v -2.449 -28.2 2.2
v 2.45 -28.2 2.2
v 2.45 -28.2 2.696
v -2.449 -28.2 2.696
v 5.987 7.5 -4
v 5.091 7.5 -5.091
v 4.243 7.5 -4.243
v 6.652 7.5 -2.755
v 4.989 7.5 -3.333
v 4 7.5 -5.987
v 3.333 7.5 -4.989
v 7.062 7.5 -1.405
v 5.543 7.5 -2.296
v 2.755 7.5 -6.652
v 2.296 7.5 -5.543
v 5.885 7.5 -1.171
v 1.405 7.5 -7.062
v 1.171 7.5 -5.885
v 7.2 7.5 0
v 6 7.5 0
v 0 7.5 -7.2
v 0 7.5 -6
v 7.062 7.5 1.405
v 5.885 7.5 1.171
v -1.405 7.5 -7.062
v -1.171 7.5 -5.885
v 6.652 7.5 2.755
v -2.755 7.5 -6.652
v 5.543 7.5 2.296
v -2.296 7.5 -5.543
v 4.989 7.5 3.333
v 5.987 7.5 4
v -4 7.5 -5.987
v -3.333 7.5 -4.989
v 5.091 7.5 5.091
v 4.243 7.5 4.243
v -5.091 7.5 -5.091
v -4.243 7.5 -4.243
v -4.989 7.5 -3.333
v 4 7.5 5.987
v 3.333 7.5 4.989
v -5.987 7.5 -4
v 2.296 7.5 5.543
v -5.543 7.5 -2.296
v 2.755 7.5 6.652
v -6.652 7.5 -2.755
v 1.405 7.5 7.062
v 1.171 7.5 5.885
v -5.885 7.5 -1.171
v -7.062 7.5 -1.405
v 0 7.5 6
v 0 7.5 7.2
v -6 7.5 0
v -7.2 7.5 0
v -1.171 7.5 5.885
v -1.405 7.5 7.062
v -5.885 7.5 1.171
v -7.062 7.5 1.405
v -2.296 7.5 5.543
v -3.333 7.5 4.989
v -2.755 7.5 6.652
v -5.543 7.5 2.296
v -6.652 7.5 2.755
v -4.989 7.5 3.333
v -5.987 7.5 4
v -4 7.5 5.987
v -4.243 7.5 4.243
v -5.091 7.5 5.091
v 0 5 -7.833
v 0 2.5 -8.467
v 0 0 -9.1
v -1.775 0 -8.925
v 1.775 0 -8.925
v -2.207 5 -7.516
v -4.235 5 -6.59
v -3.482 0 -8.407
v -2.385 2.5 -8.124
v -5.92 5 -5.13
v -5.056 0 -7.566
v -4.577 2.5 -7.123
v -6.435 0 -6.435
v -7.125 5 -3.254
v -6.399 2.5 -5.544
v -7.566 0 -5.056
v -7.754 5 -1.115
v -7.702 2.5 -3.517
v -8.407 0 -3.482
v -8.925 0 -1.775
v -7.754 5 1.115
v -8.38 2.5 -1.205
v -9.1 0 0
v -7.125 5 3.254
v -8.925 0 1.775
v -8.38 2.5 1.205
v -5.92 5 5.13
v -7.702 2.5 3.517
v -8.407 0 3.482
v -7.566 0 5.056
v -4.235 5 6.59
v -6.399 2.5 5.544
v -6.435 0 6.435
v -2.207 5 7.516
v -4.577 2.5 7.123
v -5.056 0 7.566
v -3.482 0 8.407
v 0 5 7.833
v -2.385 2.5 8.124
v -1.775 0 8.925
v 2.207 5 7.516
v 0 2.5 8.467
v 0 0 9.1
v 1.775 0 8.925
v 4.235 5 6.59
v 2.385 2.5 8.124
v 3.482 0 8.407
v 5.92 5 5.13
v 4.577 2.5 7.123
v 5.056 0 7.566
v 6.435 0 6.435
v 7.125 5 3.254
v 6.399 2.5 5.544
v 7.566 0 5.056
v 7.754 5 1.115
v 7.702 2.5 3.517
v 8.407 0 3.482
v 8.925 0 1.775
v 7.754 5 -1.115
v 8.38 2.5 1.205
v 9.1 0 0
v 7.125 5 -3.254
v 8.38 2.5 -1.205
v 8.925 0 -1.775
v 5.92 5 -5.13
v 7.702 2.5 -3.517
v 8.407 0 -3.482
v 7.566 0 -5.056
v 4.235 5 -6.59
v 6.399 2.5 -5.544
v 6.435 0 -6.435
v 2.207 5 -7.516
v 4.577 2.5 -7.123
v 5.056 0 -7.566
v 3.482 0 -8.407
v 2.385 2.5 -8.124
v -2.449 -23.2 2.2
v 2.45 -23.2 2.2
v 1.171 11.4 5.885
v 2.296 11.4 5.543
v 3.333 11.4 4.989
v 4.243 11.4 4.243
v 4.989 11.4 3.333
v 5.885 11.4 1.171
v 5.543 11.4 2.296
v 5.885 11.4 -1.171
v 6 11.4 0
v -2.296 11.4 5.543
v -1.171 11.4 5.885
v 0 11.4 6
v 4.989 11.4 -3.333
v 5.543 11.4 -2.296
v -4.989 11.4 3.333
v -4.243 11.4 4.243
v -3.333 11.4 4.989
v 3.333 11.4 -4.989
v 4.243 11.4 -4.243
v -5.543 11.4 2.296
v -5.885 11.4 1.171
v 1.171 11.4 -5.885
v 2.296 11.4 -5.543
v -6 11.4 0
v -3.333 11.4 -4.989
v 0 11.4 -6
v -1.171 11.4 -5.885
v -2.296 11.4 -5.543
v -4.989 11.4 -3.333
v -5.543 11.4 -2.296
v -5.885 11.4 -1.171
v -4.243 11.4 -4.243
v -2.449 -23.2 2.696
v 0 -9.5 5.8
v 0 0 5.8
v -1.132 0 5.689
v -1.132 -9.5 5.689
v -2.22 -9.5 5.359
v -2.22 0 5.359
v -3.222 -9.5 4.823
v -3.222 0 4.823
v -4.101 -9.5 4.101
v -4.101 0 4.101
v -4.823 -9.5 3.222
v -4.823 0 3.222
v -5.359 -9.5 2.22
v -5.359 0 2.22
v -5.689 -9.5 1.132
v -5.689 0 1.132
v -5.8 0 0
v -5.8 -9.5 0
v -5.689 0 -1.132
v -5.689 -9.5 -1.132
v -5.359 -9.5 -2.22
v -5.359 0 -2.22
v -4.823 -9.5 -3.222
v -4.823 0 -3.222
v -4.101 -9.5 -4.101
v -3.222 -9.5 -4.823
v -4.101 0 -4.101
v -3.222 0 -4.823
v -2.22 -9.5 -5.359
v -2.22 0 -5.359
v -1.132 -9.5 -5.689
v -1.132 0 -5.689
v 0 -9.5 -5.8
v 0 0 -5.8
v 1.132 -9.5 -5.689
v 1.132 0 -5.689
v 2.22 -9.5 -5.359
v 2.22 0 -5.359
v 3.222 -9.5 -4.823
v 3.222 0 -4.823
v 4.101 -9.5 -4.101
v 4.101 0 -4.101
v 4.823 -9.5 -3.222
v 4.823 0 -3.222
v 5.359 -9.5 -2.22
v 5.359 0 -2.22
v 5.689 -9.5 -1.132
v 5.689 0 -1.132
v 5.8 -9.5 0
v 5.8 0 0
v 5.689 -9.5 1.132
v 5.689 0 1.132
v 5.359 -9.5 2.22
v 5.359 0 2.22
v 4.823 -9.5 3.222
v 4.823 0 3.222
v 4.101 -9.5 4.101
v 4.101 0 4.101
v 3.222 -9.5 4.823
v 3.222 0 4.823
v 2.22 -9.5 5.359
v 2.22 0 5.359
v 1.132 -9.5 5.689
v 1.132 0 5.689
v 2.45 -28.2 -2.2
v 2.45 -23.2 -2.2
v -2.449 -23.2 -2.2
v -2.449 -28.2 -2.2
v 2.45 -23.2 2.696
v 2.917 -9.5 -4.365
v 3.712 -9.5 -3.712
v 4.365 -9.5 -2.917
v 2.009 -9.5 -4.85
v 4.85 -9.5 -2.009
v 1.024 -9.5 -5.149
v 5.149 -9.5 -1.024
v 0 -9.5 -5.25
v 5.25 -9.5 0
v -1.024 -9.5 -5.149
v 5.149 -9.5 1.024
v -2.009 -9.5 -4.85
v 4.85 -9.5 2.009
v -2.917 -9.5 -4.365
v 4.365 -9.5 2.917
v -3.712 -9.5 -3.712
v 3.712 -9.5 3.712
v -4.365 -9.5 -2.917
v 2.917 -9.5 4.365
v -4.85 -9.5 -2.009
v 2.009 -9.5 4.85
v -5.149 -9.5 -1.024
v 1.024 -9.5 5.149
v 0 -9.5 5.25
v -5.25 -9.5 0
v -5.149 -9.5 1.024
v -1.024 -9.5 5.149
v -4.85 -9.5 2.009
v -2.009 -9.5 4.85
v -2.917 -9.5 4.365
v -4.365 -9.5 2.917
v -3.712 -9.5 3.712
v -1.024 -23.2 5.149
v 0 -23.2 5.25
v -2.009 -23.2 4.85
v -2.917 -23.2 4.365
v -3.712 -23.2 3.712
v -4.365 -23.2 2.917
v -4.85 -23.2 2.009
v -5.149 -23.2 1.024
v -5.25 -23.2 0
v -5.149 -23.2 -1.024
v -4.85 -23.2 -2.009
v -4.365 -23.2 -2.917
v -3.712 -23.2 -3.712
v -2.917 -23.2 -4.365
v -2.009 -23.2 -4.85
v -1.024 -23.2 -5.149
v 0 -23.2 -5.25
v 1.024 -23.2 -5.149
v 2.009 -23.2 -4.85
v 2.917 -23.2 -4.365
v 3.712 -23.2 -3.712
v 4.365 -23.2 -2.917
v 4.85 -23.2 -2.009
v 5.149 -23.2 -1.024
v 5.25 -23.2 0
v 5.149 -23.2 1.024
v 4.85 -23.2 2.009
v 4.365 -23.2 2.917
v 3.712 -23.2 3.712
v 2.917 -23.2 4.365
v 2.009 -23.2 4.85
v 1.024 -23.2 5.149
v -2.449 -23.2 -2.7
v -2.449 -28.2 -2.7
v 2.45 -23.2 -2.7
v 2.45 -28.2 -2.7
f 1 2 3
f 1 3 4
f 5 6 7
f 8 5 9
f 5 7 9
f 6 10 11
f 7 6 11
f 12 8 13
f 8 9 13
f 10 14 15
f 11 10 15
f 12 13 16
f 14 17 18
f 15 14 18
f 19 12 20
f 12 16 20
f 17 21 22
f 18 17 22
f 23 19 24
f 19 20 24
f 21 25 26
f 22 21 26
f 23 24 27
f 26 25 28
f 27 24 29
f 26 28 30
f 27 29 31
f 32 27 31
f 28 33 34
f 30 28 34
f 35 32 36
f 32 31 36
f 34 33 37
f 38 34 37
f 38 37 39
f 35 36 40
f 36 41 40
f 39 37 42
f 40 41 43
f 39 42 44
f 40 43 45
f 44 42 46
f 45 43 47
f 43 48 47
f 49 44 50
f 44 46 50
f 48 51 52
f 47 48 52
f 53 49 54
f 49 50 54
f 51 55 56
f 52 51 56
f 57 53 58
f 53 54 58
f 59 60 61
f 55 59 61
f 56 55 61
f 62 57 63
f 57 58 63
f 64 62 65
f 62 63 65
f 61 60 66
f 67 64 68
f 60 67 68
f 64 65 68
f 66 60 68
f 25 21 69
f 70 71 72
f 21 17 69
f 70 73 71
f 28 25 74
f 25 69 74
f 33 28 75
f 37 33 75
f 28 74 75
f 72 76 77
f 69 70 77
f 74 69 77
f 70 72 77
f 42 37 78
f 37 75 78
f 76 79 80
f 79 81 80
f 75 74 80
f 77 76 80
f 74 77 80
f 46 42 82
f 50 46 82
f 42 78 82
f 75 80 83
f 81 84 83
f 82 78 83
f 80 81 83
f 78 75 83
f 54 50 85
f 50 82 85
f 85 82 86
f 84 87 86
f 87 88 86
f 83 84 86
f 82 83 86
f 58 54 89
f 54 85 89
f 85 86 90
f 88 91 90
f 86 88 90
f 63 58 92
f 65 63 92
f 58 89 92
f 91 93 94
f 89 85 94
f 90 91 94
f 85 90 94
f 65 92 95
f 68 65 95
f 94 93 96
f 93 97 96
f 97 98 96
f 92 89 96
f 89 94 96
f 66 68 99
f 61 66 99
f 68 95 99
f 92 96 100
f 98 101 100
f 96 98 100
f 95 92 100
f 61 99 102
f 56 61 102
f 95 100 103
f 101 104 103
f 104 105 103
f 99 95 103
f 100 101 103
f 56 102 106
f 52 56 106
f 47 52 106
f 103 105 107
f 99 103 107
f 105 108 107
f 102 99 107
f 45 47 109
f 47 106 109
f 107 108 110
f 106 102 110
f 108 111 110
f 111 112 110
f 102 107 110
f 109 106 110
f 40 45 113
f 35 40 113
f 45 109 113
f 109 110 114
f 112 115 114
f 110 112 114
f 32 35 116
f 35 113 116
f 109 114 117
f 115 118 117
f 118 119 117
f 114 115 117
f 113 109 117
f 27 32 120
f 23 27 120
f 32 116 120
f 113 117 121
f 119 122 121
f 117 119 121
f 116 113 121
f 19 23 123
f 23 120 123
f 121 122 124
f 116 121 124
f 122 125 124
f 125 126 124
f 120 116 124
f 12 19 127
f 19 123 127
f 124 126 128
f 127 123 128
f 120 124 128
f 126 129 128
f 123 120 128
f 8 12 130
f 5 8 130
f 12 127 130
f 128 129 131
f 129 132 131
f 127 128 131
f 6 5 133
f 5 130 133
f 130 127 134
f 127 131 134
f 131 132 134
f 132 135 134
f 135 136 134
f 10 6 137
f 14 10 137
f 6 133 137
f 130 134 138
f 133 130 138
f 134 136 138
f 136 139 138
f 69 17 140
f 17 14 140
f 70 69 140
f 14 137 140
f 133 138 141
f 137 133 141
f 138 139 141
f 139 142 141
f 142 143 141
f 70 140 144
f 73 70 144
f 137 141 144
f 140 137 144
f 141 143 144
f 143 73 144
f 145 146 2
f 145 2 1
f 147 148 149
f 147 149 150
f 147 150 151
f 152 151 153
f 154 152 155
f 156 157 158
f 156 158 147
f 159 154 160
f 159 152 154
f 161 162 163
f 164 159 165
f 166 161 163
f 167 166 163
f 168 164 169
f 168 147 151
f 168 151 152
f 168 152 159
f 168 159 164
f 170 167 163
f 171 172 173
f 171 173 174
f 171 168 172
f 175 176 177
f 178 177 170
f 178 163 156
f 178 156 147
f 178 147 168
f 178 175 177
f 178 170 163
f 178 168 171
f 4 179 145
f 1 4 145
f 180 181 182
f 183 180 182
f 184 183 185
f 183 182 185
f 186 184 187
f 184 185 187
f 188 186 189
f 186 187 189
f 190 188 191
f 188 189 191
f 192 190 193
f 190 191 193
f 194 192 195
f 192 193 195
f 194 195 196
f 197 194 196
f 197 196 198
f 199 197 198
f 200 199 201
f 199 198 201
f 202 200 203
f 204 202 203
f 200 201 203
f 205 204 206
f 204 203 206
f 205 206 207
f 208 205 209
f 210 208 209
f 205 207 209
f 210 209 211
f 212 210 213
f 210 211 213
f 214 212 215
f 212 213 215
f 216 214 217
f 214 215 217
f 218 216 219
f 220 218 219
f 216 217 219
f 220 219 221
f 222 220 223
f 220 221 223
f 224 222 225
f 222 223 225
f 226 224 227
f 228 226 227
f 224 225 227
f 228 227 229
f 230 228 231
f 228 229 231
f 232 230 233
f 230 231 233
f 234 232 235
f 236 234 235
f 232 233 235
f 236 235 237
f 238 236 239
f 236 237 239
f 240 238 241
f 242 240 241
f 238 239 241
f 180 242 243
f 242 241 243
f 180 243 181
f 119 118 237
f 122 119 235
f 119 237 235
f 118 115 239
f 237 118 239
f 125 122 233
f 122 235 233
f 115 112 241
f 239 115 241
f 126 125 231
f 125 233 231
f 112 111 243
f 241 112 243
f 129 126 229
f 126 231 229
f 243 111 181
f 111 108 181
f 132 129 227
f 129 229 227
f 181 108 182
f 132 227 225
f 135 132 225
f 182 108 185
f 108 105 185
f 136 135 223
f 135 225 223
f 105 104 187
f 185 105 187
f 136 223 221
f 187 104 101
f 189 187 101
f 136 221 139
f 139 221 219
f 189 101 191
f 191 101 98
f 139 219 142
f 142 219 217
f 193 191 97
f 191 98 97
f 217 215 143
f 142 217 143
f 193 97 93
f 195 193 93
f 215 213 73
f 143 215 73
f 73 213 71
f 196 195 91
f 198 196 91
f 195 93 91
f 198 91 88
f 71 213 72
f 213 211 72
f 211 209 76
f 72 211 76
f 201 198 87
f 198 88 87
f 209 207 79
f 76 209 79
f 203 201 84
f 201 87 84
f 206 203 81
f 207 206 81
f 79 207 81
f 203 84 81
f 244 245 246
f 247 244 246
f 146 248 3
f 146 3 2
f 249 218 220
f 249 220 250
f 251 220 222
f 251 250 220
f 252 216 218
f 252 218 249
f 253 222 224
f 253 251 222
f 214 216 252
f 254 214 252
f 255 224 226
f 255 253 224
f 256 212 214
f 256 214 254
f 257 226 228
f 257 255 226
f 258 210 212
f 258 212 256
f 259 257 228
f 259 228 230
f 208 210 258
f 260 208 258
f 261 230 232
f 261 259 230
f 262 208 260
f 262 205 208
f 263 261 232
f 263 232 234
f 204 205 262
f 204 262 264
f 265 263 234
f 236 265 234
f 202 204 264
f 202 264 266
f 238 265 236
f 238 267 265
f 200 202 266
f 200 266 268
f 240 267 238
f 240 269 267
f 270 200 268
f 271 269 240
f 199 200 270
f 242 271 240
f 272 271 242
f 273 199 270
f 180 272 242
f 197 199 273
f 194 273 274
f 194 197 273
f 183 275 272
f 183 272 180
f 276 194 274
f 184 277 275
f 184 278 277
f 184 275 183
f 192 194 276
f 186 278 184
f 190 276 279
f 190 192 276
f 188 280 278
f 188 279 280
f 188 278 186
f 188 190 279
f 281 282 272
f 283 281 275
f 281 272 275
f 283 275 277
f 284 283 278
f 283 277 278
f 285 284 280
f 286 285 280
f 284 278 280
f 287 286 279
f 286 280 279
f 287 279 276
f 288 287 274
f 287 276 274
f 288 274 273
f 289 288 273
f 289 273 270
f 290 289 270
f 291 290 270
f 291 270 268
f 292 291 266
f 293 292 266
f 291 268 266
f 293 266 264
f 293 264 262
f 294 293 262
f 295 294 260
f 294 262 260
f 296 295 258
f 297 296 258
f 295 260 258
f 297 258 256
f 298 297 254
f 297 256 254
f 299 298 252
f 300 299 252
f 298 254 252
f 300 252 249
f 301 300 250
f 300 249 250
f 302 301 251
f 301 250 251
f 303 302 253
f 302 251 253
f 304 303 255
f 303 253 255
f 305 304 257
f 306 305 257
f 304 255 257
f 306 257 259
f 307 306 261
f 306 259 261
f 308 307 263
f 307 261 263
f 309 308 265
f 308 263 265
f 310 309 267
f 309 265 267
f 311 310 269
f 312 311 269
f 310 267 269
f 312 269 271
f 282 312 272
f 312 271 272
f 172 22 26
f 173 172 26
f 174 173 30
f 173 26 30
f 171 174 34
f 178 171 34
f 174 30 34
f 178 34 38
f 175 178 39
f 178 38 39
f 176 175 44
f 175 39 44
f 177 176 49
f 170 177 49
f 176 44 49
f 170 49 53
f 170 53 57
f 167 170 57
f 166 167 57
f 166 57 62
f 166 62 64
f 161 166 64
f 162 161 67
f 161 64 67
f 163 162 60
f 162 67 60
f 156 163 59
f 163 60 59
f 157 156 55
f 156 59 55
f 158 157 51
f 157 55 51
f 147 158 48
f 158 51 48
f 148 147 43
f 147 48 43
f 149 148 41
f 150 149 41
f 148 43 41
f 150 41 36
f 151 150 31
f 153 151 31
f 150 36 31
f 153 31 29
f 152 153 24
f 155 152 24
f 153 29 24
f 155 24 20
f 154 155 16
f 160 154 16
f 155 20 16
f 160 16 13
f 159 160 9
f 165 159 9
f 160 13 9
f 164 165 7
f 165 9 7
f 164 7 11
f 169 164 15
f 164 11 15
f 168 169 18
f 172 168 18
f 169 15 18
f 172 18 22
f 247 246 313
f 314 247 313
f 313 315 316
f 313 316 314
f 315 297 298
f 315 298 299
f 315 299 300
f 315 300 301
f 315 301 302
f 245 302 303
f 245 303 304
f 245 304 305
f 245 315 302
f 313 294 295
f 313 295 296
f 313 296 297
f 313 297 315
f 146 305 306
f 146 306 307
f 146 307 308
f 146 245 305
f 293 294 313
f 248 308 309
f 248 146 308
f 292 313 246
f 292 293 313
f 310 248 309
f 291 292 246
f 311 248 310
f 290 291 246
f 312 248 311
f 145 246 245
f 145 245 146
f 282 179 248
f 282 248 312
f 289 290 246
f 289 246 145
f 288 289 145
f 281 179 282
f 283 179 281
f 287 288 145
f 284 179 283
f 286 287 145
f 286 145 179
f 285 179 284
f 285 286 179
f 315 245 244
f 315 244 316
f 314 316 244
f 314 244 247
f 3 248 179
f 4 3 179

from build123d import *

# Parameters (mm, degrees)
SKETCH_6_R      = 6
EXTRUDE_3_DEPTH = 3.9
SKETCH_7_R      = 5.8
EXTRUDE_4_DEPTH = 9.5
SKETCH_8_R      = 5.25
EXTRUDE_5_DEPTH = 13.7
SKETCH_9_W      = 4.89861288
SKETCH_9_H      = 0.5003769
SKETCH_9_H_2    = 0.495607413
EXTRUDE_6_DEPTH = 5


with BuildPart() as part:
    # Эскиз5 → Повернуть1 (revolve)
    with BuildSketch(Plane.XY, mode=Mode.PRIVATE) as revolve_1_sk:
        Polygon((-7.2, 7.5), (-9.1, 0), (0, 0), (0, 7.5), align=None)
    revolve(revolve_1_sk.sketch.rotate(Axis((0, 0, 0), (0, 1, 0)), 270), axis=Axis((0, 0, 0), (0, 1, 0)))

    # Эскиз6 → Бобышка-Вытянуть3 (add)
    with BuildSketch(Plane(origin=(0, 7.5, 0), x_dir=(1, 0, 0), z_dir=(0, 1, 0))):
        with Locations(Location((0, 0, 0), (0, 0, 90))):
            Circle(SKETCH_6_R)
    extrude(amount=EXTRUDE_3_DEPTH)

    # Эскиз7 → Бобышка-Вытянуть4 (add)
    with BuildSketch(Plane.XZ):
        with Locations(Location((0, 0, 0), (0, 0, 90))):
            Circle(SKETCH_7_R)
    extrude(amount=EXTRUDE_4_DEPTH)

    # Эскиз8 → Бобышка-Вытянуть5 (add)
    with BuildSketch(Plane.XZ.offset(9.5)):
        with Locations(Location((0, 0, 0), (0, 0, 90))):
            Circle(SKETCH_8_R)
    extrude(amount=EXTRUDE_5_DEPTH)

    # Эскиз9 → Бобышка-Вытянуть6 (add)
    with BuildSketch(Plane(origin=(0, -23.2, 0), x_dir=(-1, 0, 0), z_dir=(0, -1, 0))):
        with Locations((-0.000422971, 2.45018845)):
            Rectangle(SKETCH_9_W, SKETCH_9_H)
        with Locations((-0.000422971, -2.447803707)):
            Rectangle(SKETCH_9_W, SKETCH_9_H_2)
    extrude(amount=EXTRUDE_6_DEPTH)


solid = part.part
